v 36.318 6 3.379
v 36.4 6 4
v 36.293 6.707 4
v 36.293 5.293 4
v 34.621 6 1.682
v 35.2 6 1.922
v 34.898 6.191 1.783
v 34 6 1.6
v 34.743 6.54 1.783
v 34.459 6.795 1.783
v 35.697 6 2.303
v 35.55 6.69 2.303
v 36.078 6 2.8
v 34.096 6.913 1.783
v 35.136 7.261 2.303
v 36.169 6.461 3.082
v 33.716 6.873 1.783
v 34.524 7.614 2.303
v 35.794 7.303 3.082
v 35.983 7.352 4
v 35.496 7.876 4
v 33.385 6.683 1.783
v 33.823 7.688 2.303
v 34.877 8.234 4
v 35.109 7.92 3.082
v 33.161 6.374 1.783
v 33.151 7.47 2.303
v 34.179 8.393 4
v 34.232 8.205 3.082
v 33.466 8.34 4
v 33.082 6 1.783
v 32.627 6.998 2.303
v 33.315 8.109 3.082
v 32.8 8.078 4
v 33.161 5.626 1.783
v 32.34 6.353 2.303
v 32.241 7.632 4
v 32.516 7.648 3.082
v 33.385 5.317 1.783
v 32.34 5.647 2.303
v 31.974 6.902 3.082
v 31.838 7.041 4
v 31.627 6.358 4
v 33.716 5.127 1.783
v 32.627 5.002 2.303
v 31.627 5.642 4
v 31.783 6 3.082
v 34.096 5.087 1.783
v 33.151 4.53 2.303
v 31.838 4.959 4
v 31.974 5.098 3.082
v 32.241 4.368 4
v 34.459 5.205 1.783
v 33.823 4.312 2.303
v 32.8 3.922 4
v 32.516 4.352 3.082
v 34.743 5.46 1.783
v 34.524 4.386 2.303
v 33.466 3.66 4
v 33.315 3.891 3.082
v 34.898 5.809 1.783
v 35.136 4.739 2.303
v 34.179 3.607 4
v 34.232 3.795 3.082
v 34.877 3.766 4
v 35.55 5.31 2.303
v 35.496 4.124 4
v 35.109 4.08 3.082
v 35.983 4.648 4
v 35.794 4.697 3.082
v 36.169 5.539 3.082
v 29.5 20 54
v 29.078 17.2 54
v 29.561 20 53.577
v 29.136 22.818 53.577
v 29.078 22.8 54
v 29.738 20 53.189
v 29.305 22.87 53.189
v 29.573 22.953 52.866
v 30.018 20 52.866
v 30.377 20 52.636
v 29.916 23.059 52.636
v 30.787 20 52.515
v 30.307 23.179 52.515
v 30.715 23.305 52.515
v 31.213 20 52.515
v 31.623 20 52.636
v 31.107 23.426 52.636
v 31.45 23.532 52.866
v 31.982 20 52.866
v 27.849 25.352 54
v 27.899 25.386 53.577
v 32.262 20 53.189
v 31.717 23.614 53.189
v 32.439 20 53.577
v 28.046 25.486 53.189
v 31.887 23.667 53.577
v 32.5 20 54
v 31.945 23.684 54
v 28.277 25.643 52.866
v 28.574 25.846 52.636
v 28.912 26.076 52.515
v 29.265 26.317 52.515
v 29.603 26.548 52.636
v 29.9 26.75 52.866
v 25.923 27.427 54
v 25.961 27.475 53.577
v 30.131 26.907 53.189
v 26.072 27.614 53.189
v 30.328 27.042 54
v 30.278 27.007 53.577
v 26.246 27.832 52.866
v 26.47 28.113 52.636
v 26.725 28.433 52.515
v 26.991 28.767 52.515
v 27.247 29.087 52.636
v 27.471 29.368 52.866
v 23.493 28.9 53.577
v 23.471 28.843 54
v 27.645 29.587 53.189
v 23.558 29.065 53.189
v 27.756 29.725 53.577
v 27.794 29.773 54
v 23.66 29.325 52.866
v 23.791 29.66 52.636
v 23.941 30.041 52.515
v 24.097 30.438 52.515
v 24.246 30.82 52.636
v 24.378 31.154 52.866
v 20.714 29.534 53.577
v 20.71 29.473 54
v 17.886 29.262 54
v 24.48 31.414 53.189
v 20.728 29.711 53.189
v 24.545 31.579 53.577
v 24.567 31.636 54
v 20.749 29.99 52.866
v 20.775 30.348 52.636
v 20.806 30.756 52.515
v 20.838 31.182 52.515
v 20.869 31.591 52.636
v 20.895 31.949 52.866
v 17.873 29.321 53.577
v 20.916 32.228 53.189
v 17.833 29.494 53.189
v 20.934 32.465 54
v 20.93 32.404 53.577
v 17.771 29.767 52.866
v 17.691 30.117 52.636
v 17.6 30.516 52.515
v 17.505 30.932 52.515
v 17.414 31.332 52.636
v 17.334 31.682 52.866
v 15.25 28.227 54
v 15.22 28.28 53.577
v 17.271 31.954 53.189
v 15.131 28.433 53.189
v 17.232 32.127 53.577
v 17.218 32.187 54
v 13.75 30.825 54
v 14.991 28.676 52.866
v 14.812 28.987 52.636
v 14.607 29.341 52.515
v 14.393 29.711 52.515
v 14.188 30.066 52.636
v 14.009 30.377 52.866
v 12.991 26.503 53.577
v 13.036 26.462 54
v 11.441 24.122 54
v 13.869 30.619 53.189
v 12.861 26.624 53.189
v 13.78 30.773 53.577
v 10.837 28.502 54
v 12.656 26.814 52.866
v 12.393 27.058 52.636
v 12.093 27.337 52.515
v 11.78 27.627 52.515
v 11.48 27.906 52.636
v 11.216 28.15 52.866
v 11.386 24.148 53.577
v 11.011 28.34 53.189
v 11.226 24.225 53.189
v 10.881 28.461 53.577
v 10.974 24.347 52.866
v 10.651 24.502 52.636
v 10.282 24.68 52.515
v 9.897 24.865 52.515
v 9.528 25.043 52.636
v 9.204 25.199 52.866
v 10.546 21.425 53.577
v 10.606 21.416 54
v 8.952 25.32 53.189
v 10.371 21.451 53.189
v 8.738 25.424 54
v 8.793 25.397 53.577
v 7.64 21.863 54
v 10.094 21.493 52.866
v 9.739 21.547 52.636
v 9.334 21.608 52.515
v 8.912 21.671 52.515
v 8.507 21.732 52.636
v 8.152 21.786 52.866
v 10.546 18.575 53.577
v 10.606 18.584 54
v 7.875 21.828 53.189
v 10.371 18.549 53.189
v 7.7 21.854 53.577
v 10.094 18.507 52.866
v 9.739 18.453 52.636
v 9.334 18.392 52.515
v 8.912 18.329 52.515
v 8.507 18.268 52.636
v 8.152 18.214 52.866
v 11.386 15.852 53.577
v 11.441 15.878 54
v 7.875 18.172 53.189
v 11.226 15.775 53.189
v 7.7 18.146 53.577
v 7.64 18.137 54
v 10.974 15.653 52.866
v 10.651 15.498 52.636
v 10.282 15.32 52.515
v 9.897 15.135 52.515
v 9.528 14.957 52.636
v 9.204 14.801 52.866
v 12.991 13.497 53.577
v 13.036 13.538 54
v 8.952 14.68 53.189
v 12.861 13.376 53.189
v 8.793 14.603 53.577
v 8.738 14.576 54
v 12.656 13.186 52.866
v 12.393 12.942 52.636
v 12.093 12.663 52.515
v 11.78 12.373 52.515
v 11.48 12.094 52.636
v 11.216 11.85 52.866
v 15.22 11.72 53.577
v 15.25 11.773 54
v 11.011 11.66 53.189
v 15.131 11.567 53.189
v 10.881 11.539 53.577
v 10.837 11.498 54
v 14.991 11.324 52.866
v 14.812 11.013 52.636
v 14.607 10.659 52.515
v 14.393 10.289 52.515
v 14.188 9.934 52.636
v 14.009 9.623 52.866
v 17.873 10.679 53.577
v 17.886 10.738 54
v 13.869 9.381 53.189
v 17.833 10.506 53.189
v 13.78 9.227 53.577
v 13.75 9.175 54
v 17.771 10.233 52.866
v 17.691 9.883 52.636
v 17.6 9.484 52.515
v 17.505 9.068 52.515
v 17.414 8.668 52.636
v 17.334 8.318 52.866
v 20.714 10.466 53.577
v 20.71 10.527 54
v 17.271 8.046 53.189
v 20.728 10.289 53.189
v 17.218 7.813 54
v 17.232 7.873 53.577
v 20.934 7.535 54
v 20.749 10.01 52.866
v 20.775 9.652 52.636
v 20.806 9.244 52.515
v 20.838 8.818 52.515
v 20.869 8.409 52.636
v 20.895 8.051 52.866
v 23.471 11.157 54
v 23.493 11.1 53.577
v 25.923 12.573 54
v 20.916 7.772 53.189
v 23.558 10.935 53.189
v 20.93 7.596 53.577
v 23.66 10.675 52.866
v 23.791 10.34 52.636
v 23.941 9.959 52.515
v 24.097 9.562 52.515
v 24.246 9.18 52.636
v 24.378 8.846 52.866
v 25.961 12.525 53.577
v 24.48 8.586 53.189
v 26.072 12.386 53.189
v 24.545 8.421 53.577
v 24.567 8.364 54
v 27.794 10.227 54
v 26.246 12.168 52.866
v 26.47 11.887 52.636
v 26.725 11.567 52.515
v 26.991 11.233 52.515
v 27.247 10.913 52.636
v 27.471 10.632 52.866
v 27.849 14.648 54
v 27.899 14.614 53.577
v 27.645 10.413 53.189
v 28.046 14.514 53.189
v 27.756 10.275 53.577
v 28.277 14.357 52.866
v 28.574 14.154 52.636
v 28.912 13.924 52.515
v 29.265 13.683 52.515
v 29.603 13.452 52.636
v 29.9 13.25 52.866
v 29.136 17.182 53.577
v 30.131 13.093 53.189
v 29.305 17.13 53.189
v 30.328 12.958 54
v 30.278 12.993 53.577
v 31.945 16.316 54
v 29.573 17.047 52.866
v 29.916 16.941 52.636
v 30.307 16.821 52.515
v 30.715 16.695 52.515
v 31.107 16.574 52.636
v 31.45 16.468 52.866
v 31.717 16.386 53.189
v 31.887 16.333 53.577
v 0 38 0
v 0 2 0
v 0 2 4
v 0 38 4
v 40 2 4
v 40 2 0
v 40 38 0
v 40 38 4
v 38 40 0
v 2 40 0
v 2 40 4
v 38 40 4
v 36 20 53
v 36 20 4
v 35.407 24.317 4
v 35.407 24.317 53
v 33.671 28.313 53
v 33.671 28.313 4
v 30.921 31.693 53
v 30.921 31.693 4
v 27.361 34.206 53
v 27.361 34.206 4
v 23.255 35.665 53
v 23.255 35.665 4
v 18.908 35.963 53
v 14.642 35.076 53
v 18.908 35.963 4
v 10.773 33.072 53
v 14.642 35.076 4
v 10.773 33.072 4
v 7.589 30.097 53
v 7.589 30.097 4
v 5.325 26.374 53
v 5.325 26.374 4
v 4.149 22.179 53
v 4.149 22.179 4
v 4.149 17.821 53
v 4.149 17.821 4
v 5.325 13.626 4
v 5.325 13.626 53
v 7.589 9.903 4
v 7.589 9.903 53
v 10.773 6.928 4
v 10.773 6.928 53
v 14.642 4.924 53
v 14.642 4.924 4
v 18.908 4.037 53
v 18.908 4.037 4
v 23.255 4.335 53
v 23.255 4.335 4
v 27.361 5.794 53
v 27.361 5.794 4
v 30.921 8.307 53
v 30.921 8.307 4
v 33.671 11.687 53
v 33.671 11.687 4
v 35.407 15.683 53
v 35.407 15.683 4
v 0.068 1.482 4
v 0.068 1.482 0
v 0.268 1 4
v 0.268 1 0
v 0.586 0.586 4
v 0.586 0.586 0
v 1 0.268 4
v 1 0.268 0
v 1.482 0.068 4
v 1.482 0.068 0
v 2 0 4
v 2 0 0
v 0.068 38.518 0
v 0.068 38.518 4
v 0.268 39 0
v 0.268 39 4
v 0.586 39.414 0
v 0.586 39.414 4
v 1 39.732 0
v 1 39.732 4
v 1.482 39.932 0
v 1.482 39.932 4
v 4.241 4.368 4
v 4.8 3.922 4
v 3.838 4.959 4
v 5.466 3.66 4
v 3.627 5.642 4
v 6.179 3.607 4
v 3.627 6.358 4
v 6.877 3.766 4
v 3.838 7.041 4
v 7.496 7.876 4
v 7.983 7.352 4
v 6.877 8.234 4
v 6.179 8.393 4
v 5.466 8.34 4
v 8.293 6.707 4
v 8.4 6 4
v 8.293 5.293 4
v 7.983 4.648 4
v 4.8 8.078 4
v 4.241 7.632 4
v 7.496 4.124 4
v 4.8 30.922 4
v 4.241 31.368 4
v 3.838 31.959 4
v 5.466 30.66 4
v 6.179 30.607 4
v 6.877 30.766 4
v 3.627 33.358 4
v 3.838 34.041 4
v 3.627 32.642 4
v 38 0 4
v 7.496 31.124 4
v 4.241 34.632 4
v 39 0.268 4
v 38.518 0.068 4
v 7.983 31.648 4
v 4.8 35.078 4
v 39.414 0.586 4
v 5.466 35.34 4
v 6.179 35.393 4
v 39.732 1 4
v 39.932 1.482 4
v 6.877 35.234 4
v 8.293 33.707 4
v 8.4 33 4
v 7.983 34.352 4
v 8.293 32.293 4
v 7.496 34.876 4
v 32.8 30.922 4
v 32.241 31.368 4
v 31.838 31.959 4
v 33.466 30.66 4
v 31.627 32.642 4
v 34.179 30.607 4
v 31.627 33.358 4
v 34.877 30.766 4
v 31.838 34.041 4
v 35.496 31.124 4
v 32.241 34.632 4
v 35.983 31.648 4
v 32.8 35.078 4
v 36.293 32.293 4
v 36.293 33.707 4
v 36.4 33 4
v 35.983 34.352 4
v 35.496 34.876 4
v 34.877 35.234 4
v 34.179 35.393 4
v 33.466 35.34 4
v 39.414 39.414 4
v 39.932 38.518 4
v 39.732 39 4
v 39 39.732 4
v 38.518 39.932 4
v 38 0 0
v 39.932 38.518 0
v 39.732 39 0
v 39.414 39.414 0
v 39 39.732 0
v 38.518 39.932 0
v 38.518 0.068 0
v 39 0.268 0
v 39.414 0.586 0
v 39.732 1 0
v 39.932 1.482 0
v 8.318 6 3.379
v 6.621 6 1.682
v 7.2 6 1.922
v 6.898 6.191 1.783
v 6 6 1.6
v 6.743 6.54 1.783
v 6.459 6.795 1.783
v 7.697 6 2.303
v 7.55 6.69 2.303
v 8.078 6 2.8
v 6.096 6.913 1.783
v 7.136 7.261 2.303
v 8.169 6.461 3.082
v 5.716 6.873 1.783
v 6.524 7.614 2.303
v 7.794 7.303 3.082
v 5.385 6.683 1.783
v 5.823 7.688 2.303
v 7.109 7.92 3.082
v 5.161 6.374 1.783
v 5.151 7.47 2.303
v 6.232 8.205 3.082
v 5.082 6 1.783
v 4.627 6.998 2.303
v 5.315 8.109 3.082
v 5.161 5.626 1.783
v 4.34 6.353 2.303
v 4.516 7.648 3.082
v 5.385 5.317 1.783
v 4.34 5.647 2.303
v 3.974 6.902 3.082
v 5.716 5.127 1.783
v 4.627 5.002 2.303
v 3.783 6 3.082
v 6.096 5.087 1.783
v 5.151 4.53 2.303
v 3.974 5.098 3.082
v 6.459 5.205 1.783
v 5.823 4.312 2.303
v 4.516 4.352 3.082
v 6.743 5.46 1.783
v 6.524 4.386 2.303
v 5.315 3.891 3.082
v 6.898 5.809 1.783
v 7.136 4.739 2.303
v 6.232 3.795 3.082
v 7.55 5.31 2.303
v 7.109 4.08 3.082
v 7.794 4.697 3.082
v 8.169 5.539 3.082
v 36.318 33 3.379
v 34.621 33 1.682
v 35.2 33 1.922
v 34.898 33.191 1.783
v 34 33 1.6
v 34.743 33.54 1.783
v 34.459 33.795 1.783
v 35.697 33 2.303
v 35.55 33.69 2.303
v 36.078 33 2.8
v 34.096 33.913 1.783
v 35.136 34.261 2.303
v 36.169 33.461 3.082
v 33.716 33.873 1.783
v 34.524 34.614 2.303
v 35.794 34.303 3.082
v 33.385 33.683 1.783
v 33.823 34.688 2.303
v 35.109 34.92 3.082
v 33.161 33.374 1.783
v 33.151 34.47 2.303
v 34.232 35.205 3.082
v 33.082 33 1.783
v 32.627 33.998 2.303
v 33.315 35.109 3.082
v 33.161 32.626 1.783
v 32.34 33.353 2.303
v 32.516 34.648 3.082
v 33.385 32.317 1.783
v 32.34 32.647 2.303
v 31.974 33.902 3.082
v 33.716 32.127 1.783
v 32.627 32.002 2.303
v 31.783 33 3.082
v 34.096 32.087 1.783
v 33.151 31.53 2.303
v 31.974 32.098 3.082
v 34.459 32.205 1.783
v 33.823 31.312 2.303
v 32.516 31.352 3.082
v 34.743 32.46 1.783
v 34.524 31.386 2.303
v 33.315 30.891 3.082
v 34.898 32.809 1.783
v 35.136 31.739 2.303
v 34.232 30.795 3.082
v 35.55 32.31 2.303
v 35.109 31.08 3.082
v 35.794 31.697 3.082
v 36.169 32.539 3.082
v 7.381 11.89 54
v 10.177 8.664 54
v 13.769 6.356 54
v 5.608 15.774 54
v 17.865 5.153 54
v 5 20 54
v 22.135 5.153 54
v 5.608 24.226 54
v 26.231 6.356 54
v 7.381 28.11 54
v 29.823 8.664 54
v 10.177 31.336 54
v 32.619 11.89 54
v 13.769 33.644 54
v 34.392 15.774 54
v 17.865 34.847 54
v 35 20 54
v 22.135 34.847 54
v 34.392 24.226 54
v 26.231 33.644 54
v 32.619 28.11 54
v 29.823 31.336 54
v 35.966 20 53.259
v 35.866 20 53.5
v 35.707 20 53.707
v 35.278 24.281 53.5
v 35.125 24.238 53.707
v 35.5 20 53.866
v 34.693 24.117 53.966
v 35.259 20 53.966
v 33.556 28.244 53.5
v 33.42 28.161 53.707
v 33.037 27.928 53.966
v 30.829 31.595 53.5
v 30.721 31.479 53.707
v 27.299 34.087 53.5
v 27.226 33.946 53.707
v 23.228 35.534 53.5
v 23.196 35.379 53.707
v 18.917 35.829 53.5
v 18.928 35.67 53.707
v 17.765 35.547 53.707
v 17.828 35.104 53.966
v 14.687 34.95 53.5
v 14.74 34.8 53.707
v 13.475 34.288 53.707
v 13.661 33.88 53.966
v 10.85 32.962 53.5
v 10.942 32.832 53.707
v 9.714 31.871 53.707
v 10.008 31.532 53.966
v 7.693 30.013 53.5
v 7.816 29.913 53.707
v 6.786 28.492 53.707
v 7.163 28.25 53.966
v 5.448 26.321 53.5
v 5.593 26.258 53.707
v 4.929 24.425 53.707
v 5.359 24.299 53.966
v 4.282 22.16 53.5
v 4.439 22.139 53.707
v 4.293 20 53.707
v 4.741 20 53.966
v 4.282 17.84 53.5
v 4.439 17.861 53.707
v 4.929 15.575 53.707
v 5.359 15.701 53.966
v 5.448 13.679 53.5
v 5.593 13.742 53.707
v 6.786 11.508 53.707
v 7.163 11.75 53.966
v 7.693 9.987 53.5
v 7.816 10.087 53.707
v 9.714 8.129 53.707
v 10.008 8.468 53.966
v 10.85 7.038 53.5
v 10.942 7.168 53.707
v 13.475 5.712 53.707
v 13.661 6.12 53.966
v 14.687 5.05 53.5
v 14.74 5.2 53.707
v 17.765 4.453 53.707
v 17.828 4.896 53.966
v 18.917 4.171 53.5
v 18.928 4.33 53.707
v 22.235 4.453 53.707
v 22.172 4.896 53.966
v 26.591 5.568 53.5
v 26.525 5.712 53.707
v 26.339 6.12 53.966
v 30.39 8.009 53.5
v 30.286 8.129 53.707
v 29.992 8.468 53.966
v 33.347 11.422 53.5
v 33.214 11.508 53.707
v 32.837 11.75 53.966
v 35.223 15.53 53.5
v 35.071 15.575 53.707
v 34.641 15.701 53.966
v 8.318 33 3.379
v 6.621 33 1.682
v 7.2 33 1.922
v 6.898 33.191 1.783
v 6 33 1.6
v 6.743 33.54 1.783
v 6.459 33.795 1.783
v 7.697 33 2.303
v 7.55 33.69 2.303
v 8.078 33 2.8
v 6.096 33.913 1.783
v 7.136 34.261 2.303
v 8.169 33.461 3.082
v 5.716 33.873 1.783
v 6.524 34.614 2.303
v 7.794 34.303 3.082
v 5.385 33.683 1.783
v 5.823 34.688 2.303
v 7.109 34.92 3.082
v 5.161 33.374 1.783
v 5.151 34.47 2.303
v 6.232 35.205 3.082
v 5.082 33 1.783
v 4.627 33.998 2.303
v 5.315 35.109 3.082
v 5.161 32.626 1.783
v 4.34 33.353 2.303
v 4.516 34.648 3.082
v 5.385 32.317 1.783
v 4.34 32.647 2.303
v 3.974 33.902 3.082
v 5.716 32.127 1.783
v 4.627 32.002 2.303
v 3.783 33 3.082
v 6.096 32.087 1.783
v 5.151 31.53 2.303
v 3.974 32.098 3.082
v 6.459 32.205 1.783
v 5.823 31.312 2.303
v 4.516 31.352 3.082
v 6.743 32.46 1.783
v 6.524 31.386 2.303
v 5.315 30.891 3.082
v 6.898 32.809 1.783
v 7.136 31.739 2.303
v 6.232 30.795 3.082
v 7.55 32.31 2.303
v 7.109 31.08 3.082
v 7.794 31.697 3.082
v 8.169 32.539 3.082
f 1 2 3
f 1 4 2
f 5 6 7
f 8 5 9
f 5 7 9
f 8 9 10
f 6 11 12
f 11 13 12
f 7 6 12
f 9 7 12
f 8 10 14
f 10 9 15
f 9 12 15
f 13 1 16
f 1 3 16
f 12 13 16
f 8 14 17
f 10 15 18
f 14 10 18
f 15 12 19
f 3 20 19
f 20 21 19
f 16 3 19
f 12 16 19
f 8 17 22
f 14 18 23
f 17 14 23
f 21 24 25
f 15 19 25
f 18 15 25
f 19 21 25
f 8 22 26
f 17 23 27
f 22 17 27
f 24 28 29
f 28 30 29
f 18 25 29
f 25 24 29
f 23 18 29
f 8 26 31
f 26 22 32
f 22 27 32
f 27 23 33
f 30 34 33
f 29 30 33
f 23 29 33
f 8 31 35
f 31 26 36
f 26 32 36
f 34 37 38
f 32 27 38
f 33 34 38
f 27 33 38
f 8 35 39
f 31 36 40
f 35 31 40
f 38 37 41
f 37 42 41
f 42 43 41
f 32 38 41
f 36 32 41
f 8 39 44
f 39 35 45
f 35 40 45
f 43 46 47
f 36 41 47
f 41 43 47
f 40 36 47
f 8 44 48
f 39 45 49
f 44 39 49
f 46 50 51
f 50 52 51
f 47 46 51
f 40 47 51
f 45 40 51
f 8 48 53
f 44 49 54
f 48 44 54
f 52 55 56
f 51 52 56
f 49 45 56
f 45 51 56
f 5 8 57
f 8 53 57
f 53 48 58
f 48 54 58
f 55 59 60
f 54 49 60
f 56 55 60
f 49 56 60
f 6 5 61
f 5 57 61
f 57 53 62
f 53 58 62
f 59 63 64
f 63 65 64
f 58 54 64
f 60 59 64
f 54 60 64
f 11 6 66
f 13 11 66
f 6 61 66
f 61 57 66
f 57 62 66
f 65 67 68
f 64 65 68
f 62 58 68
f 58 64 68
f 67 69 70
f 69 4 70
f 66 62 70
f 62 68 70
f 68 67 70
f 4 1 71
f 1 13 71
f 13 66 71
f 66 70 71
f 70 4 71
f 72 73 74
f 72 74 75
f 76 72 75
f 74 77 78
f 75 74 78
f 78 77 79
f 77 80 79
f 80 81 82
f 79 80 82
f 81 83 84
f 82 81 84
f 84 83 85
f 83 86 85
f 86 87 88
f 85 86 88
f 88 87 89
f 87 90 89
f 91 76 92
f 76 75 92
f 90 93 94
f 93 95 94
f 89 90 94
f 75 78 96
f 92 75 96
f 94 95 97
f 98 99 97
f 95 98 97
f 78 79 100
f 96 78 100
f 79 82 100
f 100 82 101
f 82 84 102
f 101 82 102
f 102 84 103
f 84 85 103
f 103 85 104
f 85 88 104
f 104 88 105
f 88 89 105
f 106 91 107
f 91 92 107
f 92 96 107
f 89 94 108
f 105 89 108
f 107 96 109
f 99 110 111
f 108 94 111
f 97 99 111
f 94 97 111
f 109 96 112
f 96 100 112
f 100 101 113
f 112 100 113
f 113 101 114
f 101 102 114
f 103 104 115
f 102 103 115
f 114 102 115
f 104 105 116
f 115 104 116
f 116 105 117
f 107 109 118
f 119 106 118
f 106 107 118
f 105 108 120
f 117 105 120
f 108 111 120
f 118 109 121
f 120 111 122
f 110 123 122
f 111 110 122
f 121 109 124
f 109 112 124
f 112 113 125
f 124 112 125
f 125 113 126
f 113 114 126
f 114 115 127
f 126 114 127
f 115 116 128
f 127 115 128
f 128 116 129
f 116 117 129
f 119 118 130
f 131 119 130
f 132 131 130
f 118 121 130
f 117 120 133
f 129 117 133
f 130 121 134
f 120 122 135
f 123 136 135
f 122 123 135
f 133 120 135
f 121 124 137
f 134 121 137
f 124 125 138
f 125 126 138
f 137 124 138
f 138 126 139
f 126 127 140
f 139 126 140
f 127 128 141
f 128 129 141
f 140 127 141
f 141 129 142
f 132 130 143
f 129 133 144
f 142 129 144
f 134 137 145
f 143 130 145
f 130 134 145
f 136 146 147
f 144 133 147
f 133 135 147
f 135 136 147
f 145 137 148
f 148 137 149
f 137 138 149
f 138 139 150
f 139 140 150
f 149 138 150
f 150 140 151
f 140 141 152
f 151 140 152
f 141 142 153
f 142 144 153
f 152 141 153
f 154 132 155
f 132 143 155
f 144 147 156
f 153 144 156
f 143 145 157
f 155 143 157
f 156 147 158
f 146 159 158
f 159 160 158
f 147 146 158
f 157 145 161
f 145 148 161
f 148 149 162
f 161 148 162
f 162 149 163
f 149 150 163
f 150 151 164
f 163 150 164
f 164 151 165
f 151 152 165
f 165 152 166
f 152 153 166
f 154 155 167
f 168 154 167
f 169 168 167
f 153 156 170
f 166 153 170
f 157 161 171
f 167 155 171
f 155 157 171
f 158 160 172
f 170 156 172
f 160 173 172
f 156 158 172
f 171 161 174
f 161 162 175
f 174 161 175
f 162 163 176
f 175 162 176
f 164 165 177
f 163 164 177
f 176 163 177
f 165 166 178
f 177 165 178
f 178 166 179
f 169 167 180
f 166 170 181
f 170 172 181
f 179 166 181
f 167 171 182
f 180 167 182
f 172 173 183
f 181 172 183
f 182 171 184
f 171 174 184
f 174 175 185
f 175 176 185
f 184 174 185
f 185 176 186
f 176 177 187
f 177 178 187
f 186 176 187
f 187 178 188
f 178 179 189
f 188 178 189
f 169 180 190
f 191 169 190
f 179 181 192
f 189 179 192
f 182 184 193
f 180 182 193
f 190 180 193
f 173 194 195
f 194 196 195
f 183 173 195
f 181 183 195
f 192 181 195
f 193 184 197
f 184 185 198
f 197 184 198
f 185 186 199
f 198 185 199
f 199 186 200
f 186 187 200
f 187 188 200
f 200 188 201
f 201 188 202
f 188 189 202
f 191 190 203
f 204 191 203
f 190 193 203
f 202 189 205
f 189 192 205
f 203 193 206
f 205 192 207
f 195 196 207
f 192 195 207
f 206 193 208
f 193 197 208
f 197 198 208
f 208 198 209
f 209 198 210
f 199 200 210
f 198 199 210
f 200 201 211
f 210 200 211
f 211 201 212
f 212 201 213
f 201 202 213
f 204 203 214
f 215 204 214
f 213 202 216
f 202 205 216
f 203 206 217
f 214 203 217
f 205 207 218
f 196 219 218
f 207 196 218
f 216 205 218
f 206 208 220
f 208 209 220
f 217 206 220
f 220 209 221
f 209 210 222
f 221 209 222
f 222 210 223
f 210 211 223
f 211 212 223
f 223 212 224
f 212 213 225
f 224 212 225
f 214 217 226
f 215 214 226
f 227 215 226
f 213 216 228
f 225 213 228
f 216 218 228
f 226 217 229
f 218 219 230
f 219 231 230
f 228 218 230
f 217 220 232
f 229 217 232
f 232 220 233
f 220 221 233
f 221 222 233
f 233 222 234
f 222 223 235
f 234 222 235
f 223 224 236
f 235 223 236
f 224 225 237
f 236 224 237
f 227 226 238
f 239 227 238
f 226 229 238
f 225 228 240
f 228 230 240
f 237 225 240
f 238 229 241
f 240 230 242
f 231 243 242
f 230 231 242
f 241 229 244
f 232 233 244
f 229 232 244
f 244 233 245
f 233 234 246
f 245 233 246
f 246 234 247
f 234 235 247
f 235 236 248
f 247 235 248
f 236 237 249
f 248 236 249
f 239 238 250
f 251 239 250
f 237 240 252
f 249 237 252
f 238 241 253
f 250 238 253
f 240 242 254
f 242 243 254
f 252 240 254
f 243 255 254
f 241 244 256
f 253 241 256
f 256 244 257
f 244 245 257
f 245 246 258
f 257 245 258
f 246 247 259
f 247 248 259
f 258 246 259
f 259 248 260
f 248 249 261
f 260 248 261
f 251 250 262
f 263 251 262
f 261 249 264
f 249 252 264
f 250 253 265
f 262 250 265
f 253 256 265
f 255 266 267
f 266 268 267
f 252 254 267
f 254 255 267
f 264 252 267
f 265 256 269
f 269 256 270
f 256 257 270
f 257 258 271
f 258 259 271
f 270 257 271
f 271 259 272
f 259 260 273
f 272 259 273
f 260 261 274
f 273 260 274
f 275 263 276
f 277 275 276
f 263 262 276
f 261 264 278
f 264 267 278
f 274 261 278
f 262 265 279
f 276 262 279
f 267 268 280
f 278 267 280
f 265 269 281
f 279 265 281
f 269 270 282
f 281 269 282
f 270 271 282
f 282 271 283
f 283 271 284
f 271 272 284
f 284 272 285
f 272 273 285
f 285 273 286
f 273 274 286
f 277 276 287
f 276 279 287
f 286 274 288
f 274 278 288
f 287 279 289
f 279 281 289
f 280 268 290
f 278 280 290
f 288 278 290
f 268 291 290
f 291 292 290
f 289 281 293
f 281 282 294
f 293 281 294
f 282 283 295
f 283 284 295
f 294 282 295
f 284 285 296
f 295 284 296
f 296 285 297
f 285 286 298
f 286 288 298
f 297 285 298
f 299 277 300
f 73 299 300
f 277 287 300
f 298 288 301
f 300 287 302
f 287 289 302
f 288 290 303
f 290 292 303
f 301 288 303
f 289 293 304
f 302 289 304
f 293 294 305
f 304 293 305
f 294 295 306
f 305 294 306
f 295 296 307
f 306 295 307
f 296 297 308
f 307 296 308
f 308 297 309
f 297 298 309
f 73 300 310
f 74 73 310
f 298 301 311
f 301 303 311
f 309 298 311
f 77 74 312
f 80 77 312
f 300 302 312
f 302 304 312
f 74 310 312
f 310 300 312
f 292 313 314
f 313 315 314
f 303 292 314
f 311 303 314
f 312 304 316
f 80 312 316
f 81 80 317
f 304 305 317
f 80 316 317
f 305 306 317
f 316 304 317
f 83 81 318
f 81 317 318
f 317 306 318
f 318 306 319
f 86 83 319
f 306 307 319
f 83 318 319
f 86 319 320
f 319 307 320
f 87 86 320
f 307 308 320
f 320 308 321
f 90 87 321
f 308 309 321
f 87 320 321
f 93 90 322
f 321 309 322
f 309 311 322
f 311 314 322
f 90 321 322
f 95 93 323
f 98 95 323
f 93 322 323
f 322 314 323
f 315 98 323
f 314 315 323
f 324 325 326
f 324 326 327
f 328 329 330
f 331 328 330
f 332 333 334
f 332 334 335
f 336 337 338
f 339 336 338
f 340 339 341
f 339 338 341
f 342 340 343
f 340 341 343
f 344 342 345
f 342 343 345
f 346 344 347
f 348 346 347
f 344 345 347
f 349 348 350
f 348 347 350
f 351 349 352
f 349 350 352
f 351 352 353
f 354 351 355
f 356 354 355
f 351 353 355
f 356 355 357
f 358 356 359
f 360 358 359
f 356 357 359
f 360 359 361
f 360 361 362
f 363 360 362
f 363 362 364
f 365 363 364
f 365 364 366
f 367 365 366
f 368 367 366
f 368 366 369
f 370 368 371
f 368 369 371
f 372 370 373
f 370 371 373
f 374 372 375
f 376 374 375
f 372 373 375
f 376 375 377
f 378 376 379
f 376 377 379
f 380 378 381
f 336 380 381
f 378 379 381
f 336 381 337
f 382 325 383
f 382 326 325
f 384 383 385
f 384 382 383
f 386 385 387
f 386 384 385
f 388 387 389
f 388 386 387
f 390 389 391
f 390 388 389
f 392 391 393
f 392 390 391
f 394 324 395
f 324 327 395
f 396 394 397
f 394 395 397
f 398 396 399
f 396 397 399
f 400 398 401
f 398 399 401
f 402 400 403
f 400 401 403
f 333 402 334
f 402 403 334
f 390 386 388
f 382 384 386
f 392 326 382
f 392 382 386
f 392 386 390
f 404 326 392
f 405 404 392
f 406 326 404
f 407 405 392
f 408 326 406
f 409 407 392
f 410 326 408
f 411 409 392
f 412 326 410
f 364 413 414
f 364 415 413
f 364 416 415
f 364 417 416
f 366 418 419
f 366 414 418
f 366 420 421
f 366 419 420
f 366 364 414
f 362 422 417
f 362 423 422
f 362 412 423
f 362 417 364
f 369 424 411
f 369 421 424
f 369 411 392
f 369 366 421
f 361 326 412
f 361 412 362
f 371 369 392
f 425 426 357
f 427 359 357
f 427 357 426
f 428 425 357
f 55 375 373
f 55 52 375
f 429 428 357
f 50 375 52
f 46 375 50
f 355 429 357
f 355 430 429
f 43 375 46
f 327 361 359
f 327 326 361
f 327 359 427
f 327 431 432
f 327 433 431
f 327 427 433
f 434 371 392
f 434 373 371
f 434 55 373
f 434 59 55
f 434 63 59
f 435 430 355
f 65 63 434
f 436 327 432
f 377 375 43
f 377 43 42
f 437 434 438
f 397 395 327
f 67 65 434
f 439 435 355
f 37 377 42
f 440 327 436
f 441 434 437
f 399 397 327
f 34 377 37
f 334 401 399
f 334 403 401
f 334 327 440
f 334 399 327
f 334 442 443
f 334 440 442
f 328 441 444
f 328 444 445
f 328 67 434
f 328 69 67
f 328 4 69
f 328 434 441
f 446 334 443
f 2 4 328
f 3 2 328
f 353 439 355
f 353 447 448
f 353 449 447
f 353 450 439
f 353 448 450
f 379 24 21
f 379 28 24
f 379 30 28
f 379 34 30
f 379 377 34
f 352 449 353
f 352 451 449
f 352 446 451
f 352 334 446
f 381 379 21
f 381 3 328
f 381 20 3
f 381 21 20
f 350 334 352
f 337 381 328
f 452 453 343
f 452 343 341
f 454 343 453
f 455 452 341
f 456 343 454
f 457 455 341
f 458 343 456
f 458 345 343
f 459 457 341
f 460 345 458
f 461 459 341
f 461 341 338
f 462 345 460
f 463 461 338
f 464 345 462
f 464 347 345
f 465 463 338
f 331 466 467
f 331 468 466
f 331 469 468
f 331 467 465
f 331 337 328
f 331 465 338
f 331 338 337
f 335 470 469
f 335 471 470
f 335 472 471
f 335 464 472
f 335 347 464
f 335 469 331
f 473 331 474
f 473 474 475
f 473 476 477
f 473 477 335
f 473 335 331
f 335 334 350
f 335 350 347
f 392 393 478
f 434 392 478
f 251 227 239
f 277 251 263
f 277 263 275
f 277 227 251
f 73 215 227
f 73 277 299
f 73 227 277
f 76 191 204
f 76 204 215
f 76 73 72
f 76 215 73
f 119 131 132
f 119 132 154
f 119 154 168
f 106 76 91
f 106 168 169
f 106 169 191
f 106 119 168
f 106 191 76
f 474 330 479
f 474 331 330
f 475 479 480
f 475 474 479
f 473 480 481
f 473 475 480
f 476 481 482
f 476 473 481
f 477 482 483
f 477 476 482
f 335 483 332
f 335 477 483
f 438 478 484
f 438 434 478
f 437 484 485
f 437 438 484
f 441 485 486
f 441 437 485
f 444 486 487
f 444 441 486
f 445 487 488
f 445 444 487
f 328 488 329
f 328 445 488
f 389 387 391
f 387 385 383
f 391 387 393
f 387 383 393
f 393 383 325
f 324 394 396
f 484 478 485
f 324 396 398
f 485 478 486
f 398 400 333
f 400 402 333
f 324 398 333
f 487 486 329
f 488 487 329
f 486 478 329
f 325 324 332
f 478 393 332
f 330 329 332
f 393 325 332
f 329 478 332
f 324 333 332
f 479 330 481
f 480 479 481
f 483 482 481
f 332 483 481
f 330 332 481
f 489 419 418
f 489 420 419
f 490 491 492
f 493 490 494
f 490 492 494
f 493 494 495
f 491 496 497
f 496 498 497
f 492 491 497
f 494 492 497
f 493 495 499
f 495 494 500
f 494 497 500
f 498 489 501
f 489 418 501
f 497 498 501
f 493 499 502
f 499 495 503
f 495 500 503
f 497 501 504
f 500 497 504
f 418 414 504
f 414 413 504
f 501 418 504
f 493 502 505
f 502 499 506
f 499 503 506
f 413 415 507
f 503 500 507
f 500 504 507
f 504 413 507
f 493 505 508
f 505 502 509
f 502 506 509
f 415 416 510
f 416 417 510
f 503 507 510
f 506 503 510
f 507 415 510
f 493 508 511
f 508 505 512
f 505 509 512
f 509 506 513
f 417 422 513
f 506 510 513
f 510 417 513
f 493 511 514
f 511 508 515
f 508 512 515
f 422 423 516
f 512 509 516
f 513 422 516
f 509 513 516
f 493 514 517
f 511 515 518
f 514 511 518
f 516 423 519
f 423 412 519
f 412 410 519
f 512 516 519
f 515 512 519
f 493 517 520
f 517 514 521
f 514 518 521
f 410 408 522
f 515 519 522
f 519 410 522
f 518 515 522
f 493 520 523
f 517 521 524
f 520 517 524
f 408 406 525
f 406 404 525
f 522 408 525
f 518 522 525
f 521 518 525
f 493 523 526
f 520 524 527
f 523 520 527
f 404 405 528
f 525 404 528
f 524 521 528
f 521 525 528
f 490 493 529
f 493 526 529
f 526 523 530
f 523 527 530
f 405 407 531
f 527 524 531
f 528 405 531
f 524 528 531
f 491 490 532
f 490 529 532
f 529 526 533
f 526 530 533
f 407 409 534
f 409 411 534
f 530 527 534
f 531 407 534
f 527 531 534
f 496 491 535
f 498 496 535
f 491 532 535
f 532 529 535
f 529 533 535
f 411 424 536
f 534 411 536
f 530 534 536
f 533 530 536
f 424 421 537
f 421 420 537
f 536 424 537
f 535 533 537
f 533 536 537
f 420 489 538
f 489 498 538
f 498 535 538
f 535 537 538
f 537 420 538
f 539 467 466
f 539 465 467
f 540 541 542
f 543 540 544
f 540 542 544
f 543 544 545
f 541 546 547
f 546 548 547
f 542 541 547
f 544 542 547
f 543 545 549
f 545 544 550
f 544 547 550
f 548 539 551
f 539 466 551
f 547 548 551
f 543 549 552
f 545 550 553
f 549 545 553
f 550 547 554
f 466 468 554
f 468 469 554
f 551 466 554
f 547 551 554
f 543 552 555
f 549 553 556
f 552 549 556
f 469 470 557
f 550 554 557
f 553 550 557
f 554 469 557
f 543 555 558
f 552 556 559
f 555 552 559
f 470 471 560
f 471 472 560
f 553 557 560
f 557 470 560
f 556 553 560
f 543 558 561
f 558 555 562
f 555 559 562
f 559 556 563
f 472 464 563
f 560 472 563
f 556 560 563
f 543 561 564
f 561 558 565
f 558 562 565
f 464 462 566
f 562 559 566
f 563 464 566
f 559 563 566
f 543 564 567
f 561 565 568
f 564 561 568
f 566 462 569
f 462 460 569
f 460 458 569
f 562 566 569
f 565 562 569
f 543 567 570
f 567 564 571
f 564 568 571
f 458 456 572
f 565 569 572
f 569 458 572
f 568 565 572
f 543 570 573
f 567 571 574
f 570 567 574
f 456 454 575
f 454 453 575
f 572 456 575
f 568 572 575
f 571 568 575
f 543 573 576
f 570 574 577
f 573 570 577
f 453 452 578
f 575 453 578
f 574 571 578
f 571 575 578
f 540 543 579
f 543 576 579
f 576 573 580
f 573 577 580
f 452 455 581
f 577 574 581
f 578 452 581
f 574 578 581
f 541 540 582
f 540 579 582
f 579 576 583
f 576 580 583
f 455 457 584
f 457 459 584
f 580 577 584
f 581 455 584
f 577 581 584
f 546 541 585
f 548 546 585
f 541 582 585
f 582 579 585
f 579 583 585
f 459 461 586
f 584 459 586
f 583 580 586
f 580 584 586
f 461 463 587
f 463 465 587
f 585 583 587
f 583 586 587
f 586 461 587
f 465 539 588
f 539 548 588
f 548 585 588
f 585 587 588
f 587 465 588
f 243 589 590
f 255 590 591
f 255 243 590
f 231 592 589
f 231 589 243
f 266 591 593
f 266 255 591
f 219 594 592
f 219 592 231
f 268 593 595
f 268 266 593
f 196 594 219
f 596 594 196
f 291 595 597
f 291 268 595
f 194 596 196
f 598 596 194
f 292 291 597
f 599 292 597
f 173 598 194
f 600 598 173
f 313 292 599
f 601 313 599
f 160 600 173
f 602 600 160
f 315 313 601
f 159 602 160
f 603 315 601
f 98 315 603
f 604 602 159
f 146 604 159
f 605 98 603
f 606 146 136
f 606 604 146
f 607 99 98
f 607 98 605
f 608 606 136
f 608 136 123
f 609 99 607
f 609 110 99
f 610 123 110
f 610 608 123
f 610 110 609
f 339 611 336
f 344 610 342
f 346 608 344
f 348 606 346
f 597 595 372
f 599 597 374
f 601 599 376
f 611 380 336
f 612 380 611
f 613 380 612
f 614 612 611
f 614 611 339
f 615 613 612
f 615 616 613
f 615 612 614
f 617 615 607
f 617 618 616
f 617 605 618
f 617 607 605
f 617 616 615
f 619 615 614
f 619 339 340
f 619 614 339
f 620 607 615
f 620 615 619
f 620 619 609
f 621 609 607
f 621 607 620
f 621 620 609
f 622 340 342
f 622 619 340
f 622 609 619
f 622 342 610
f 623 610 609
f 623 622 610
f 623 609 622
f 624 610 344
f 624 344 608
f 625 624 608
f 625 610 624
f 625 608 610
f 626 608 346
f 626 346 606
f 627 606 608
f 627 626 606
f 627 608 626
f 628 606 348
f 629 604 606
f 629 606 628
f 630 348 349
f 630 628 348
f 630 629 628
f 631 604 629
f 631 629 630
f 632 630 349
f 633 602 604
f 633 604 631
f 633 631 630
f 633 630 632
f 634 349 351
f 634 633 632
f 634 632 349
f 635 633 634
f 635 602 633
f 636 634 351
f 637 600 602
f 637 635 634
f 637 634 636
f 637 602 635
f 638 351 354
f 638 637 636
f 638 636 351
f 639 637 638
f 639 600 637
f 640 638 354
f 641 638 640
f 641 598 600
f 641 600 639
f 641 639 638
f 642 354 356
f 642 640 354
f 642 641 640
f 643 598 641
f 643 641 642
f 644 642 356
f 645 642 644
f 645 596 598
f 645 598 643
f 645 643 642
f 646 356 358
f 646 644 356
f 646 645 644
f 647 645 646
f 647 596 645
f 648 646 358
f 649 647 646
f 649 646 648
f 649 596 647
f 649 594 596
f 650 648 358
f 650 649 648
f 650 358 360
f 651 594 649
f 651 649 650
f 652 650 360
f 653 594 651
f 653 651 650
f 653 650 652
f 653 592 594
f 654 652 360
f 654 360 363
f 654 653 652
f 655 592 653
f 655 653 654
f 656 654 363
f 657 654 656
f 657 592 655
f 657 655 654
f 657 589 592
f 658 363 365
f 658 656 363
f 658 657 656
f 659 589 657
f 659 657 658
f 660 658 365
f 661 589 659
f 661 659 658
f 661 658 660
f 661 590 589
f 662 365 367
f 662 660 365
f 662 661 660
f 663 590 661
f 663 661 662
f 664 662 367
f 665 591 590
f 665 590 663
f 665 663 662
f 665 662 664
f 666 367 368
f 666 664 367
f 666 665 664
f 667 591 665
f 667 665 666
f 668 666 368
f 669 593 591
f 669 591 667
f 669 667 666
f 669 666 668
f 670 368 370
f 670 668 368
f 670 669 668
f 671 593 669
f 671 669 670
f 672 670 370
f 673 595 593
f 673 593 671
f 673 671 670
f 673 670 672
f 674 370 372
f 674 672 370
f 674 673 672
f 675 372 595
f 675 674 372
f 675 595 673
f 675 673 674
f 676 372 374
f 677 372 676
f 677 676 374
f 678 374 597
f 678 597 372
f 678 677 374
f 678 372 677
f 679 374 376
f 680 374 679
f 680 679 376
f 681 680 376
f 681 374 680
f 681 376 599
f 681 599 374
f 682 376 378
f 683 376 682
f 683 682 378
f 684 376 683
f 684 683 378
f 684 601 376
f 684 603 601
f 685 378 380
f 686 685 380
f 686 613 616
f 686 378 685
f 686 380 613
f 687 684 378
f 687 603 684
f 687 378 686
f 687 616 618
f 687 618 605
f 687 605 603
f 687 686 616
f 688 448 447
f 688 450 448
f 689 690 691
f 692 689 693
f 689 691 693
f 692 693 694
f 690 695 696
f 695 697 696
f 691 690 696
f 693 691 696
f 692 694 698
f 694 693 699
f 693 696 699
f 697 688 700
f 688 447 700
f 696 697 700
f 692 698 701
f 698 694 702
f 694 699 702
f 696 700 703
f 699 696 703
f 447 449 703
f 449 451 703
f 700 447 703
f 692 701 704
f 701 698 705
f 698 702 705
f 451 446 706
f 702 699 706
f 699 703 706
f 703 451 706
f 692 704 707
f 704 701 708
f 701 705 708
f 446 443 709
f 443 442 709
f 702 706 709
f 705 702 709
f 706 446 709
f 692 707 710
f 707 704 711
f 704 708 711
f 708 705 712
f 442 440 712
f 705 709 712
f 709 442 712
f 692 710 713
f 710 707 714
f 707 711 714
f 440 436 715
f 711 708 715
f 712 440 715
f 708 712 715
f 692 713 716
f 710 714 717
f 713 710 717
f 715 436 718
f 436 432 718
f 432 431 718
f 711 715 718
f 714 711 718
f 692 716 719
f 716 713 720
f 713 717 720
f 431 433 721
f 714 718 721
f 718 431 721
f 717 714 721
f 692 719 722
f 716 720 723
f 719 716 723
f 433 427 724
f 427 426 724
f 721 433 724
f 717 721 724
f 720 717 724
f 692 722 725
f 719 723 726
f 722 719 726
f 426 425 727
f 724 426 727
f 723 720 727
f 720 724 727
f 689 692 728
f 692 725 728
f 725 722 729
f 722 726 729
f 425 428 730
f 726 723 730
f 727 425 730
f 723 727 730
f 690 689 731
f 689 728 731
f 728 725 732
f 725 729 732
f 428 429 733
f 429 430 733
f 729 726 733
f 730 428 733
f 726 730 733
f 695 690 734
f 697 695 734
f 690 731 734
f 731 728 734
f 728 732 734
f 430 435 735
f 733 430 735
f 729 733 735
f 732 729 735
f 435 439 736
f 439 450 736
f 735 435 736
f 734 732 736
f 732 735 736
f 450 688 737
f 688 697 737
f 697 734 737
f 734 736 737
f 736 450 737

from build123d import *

# Parameters (mm, degrees)
TORUS_R        = 1.5
CYLINDER_R     = 16
CYLINDER_DEPTH = 50
FILLET001_R    = 1
ARRAY_X_COUNT  = 2
ARRAY_X_PITCH  = 28
ARRAY_Y_COUNT  = 2
ARRAY_Y_PITCH  = 27
BOX_W          = 40
BOX_H          = 40
BOX_DEPTH      = 4
FILLET_R       = 2


with BuildPart() as torus:
    # Torus → Torus (revolve)
    with BuildSketch(Plane(origin=(20, 20, 54), x_dir=(1, 0, 0), z_dir=(0, -1, 0))):
        with Locations((11, 0)):
            Circle(TORUS_R)
    revolve(axis=Axis((20, 20, 54), (0, 0, 1)))


with BuildPart() as cut001:
    # Cylinder → Cylinder (new body)
    with BuildSketch(Plane(origin=(20, 20, 4), x_dir=(1, 0, 0), z_dir=(0, 0, 1))):
        Circle(CYLINDER_R)
    extrude(amount=CYLINDER_DEPTH)

    # Fillet001
    fillet001_edges = [cut001.edges().sort_by_distance(p)[0] for p in [
        (4, 20, 54),
    ]]
    fillet(fillet001_edges, radius=FILLET001_R)

    # Cut001: cut Torus
    add(torus.part, mode=Mode.SUBTRACT)


with BuildPart() as array:
    # Sphere → Sphere (revolve)
    with BuildSketch(Plane(origin=(6, 6, 4), x_dir=(1, 0, 0), z_dir=(0, -1, 0))):
        with BuildLine():
            ThreePointArc((0, -2.4), (2.4, 0), (0, 2.4))
            Line((0, 2.4), (0, -2.4))
        make_face()
    revolve(axis=Axis((6, 6, 4), (0, 0, 1)))

    # Array X: Array ×2


with BuildPart() as array_1:
    add(array.part)
    with Locations(*[(i * ARRAY_X_PITCH, 0, 0) for i in range(1, ARRAY_X_COUNT)]):
        add(array.part)

    # Array Y: Array ×2


with BuildPart() as array_2:
    add(array_1.part)
    with Locations(*[(0, i * ARRAY_Y_PITCH, 0) for i in range(1, ARRAY_Y_COUNT)]):
        add(array_1.part)


with BuildPart() as fusion:
    # Box → Box (new body)
    with BuildSketch(Plane.XY):
        with Locations((20, 20)):
            Rectangle(BOX_W, BOX_H)
    extrude(amount=BOX_DEPTH)

    # Fillet
    fillet_edges = [fusion.edges().sort_by_distance(p)[0] for p in [
        (0, 0, 2),
        (0, 40, 2),
        (40, 0, 2),
        (40, 40, 2),
    ]]
    fillet(fillet_edges, radius=FILLET_R)

    # Cut: cut Array
    add(array_2.part, mode=Mode.SUBTRACT)

    # Fusion: union Cut001
    add(cut001.part)


solid = fusion.part
